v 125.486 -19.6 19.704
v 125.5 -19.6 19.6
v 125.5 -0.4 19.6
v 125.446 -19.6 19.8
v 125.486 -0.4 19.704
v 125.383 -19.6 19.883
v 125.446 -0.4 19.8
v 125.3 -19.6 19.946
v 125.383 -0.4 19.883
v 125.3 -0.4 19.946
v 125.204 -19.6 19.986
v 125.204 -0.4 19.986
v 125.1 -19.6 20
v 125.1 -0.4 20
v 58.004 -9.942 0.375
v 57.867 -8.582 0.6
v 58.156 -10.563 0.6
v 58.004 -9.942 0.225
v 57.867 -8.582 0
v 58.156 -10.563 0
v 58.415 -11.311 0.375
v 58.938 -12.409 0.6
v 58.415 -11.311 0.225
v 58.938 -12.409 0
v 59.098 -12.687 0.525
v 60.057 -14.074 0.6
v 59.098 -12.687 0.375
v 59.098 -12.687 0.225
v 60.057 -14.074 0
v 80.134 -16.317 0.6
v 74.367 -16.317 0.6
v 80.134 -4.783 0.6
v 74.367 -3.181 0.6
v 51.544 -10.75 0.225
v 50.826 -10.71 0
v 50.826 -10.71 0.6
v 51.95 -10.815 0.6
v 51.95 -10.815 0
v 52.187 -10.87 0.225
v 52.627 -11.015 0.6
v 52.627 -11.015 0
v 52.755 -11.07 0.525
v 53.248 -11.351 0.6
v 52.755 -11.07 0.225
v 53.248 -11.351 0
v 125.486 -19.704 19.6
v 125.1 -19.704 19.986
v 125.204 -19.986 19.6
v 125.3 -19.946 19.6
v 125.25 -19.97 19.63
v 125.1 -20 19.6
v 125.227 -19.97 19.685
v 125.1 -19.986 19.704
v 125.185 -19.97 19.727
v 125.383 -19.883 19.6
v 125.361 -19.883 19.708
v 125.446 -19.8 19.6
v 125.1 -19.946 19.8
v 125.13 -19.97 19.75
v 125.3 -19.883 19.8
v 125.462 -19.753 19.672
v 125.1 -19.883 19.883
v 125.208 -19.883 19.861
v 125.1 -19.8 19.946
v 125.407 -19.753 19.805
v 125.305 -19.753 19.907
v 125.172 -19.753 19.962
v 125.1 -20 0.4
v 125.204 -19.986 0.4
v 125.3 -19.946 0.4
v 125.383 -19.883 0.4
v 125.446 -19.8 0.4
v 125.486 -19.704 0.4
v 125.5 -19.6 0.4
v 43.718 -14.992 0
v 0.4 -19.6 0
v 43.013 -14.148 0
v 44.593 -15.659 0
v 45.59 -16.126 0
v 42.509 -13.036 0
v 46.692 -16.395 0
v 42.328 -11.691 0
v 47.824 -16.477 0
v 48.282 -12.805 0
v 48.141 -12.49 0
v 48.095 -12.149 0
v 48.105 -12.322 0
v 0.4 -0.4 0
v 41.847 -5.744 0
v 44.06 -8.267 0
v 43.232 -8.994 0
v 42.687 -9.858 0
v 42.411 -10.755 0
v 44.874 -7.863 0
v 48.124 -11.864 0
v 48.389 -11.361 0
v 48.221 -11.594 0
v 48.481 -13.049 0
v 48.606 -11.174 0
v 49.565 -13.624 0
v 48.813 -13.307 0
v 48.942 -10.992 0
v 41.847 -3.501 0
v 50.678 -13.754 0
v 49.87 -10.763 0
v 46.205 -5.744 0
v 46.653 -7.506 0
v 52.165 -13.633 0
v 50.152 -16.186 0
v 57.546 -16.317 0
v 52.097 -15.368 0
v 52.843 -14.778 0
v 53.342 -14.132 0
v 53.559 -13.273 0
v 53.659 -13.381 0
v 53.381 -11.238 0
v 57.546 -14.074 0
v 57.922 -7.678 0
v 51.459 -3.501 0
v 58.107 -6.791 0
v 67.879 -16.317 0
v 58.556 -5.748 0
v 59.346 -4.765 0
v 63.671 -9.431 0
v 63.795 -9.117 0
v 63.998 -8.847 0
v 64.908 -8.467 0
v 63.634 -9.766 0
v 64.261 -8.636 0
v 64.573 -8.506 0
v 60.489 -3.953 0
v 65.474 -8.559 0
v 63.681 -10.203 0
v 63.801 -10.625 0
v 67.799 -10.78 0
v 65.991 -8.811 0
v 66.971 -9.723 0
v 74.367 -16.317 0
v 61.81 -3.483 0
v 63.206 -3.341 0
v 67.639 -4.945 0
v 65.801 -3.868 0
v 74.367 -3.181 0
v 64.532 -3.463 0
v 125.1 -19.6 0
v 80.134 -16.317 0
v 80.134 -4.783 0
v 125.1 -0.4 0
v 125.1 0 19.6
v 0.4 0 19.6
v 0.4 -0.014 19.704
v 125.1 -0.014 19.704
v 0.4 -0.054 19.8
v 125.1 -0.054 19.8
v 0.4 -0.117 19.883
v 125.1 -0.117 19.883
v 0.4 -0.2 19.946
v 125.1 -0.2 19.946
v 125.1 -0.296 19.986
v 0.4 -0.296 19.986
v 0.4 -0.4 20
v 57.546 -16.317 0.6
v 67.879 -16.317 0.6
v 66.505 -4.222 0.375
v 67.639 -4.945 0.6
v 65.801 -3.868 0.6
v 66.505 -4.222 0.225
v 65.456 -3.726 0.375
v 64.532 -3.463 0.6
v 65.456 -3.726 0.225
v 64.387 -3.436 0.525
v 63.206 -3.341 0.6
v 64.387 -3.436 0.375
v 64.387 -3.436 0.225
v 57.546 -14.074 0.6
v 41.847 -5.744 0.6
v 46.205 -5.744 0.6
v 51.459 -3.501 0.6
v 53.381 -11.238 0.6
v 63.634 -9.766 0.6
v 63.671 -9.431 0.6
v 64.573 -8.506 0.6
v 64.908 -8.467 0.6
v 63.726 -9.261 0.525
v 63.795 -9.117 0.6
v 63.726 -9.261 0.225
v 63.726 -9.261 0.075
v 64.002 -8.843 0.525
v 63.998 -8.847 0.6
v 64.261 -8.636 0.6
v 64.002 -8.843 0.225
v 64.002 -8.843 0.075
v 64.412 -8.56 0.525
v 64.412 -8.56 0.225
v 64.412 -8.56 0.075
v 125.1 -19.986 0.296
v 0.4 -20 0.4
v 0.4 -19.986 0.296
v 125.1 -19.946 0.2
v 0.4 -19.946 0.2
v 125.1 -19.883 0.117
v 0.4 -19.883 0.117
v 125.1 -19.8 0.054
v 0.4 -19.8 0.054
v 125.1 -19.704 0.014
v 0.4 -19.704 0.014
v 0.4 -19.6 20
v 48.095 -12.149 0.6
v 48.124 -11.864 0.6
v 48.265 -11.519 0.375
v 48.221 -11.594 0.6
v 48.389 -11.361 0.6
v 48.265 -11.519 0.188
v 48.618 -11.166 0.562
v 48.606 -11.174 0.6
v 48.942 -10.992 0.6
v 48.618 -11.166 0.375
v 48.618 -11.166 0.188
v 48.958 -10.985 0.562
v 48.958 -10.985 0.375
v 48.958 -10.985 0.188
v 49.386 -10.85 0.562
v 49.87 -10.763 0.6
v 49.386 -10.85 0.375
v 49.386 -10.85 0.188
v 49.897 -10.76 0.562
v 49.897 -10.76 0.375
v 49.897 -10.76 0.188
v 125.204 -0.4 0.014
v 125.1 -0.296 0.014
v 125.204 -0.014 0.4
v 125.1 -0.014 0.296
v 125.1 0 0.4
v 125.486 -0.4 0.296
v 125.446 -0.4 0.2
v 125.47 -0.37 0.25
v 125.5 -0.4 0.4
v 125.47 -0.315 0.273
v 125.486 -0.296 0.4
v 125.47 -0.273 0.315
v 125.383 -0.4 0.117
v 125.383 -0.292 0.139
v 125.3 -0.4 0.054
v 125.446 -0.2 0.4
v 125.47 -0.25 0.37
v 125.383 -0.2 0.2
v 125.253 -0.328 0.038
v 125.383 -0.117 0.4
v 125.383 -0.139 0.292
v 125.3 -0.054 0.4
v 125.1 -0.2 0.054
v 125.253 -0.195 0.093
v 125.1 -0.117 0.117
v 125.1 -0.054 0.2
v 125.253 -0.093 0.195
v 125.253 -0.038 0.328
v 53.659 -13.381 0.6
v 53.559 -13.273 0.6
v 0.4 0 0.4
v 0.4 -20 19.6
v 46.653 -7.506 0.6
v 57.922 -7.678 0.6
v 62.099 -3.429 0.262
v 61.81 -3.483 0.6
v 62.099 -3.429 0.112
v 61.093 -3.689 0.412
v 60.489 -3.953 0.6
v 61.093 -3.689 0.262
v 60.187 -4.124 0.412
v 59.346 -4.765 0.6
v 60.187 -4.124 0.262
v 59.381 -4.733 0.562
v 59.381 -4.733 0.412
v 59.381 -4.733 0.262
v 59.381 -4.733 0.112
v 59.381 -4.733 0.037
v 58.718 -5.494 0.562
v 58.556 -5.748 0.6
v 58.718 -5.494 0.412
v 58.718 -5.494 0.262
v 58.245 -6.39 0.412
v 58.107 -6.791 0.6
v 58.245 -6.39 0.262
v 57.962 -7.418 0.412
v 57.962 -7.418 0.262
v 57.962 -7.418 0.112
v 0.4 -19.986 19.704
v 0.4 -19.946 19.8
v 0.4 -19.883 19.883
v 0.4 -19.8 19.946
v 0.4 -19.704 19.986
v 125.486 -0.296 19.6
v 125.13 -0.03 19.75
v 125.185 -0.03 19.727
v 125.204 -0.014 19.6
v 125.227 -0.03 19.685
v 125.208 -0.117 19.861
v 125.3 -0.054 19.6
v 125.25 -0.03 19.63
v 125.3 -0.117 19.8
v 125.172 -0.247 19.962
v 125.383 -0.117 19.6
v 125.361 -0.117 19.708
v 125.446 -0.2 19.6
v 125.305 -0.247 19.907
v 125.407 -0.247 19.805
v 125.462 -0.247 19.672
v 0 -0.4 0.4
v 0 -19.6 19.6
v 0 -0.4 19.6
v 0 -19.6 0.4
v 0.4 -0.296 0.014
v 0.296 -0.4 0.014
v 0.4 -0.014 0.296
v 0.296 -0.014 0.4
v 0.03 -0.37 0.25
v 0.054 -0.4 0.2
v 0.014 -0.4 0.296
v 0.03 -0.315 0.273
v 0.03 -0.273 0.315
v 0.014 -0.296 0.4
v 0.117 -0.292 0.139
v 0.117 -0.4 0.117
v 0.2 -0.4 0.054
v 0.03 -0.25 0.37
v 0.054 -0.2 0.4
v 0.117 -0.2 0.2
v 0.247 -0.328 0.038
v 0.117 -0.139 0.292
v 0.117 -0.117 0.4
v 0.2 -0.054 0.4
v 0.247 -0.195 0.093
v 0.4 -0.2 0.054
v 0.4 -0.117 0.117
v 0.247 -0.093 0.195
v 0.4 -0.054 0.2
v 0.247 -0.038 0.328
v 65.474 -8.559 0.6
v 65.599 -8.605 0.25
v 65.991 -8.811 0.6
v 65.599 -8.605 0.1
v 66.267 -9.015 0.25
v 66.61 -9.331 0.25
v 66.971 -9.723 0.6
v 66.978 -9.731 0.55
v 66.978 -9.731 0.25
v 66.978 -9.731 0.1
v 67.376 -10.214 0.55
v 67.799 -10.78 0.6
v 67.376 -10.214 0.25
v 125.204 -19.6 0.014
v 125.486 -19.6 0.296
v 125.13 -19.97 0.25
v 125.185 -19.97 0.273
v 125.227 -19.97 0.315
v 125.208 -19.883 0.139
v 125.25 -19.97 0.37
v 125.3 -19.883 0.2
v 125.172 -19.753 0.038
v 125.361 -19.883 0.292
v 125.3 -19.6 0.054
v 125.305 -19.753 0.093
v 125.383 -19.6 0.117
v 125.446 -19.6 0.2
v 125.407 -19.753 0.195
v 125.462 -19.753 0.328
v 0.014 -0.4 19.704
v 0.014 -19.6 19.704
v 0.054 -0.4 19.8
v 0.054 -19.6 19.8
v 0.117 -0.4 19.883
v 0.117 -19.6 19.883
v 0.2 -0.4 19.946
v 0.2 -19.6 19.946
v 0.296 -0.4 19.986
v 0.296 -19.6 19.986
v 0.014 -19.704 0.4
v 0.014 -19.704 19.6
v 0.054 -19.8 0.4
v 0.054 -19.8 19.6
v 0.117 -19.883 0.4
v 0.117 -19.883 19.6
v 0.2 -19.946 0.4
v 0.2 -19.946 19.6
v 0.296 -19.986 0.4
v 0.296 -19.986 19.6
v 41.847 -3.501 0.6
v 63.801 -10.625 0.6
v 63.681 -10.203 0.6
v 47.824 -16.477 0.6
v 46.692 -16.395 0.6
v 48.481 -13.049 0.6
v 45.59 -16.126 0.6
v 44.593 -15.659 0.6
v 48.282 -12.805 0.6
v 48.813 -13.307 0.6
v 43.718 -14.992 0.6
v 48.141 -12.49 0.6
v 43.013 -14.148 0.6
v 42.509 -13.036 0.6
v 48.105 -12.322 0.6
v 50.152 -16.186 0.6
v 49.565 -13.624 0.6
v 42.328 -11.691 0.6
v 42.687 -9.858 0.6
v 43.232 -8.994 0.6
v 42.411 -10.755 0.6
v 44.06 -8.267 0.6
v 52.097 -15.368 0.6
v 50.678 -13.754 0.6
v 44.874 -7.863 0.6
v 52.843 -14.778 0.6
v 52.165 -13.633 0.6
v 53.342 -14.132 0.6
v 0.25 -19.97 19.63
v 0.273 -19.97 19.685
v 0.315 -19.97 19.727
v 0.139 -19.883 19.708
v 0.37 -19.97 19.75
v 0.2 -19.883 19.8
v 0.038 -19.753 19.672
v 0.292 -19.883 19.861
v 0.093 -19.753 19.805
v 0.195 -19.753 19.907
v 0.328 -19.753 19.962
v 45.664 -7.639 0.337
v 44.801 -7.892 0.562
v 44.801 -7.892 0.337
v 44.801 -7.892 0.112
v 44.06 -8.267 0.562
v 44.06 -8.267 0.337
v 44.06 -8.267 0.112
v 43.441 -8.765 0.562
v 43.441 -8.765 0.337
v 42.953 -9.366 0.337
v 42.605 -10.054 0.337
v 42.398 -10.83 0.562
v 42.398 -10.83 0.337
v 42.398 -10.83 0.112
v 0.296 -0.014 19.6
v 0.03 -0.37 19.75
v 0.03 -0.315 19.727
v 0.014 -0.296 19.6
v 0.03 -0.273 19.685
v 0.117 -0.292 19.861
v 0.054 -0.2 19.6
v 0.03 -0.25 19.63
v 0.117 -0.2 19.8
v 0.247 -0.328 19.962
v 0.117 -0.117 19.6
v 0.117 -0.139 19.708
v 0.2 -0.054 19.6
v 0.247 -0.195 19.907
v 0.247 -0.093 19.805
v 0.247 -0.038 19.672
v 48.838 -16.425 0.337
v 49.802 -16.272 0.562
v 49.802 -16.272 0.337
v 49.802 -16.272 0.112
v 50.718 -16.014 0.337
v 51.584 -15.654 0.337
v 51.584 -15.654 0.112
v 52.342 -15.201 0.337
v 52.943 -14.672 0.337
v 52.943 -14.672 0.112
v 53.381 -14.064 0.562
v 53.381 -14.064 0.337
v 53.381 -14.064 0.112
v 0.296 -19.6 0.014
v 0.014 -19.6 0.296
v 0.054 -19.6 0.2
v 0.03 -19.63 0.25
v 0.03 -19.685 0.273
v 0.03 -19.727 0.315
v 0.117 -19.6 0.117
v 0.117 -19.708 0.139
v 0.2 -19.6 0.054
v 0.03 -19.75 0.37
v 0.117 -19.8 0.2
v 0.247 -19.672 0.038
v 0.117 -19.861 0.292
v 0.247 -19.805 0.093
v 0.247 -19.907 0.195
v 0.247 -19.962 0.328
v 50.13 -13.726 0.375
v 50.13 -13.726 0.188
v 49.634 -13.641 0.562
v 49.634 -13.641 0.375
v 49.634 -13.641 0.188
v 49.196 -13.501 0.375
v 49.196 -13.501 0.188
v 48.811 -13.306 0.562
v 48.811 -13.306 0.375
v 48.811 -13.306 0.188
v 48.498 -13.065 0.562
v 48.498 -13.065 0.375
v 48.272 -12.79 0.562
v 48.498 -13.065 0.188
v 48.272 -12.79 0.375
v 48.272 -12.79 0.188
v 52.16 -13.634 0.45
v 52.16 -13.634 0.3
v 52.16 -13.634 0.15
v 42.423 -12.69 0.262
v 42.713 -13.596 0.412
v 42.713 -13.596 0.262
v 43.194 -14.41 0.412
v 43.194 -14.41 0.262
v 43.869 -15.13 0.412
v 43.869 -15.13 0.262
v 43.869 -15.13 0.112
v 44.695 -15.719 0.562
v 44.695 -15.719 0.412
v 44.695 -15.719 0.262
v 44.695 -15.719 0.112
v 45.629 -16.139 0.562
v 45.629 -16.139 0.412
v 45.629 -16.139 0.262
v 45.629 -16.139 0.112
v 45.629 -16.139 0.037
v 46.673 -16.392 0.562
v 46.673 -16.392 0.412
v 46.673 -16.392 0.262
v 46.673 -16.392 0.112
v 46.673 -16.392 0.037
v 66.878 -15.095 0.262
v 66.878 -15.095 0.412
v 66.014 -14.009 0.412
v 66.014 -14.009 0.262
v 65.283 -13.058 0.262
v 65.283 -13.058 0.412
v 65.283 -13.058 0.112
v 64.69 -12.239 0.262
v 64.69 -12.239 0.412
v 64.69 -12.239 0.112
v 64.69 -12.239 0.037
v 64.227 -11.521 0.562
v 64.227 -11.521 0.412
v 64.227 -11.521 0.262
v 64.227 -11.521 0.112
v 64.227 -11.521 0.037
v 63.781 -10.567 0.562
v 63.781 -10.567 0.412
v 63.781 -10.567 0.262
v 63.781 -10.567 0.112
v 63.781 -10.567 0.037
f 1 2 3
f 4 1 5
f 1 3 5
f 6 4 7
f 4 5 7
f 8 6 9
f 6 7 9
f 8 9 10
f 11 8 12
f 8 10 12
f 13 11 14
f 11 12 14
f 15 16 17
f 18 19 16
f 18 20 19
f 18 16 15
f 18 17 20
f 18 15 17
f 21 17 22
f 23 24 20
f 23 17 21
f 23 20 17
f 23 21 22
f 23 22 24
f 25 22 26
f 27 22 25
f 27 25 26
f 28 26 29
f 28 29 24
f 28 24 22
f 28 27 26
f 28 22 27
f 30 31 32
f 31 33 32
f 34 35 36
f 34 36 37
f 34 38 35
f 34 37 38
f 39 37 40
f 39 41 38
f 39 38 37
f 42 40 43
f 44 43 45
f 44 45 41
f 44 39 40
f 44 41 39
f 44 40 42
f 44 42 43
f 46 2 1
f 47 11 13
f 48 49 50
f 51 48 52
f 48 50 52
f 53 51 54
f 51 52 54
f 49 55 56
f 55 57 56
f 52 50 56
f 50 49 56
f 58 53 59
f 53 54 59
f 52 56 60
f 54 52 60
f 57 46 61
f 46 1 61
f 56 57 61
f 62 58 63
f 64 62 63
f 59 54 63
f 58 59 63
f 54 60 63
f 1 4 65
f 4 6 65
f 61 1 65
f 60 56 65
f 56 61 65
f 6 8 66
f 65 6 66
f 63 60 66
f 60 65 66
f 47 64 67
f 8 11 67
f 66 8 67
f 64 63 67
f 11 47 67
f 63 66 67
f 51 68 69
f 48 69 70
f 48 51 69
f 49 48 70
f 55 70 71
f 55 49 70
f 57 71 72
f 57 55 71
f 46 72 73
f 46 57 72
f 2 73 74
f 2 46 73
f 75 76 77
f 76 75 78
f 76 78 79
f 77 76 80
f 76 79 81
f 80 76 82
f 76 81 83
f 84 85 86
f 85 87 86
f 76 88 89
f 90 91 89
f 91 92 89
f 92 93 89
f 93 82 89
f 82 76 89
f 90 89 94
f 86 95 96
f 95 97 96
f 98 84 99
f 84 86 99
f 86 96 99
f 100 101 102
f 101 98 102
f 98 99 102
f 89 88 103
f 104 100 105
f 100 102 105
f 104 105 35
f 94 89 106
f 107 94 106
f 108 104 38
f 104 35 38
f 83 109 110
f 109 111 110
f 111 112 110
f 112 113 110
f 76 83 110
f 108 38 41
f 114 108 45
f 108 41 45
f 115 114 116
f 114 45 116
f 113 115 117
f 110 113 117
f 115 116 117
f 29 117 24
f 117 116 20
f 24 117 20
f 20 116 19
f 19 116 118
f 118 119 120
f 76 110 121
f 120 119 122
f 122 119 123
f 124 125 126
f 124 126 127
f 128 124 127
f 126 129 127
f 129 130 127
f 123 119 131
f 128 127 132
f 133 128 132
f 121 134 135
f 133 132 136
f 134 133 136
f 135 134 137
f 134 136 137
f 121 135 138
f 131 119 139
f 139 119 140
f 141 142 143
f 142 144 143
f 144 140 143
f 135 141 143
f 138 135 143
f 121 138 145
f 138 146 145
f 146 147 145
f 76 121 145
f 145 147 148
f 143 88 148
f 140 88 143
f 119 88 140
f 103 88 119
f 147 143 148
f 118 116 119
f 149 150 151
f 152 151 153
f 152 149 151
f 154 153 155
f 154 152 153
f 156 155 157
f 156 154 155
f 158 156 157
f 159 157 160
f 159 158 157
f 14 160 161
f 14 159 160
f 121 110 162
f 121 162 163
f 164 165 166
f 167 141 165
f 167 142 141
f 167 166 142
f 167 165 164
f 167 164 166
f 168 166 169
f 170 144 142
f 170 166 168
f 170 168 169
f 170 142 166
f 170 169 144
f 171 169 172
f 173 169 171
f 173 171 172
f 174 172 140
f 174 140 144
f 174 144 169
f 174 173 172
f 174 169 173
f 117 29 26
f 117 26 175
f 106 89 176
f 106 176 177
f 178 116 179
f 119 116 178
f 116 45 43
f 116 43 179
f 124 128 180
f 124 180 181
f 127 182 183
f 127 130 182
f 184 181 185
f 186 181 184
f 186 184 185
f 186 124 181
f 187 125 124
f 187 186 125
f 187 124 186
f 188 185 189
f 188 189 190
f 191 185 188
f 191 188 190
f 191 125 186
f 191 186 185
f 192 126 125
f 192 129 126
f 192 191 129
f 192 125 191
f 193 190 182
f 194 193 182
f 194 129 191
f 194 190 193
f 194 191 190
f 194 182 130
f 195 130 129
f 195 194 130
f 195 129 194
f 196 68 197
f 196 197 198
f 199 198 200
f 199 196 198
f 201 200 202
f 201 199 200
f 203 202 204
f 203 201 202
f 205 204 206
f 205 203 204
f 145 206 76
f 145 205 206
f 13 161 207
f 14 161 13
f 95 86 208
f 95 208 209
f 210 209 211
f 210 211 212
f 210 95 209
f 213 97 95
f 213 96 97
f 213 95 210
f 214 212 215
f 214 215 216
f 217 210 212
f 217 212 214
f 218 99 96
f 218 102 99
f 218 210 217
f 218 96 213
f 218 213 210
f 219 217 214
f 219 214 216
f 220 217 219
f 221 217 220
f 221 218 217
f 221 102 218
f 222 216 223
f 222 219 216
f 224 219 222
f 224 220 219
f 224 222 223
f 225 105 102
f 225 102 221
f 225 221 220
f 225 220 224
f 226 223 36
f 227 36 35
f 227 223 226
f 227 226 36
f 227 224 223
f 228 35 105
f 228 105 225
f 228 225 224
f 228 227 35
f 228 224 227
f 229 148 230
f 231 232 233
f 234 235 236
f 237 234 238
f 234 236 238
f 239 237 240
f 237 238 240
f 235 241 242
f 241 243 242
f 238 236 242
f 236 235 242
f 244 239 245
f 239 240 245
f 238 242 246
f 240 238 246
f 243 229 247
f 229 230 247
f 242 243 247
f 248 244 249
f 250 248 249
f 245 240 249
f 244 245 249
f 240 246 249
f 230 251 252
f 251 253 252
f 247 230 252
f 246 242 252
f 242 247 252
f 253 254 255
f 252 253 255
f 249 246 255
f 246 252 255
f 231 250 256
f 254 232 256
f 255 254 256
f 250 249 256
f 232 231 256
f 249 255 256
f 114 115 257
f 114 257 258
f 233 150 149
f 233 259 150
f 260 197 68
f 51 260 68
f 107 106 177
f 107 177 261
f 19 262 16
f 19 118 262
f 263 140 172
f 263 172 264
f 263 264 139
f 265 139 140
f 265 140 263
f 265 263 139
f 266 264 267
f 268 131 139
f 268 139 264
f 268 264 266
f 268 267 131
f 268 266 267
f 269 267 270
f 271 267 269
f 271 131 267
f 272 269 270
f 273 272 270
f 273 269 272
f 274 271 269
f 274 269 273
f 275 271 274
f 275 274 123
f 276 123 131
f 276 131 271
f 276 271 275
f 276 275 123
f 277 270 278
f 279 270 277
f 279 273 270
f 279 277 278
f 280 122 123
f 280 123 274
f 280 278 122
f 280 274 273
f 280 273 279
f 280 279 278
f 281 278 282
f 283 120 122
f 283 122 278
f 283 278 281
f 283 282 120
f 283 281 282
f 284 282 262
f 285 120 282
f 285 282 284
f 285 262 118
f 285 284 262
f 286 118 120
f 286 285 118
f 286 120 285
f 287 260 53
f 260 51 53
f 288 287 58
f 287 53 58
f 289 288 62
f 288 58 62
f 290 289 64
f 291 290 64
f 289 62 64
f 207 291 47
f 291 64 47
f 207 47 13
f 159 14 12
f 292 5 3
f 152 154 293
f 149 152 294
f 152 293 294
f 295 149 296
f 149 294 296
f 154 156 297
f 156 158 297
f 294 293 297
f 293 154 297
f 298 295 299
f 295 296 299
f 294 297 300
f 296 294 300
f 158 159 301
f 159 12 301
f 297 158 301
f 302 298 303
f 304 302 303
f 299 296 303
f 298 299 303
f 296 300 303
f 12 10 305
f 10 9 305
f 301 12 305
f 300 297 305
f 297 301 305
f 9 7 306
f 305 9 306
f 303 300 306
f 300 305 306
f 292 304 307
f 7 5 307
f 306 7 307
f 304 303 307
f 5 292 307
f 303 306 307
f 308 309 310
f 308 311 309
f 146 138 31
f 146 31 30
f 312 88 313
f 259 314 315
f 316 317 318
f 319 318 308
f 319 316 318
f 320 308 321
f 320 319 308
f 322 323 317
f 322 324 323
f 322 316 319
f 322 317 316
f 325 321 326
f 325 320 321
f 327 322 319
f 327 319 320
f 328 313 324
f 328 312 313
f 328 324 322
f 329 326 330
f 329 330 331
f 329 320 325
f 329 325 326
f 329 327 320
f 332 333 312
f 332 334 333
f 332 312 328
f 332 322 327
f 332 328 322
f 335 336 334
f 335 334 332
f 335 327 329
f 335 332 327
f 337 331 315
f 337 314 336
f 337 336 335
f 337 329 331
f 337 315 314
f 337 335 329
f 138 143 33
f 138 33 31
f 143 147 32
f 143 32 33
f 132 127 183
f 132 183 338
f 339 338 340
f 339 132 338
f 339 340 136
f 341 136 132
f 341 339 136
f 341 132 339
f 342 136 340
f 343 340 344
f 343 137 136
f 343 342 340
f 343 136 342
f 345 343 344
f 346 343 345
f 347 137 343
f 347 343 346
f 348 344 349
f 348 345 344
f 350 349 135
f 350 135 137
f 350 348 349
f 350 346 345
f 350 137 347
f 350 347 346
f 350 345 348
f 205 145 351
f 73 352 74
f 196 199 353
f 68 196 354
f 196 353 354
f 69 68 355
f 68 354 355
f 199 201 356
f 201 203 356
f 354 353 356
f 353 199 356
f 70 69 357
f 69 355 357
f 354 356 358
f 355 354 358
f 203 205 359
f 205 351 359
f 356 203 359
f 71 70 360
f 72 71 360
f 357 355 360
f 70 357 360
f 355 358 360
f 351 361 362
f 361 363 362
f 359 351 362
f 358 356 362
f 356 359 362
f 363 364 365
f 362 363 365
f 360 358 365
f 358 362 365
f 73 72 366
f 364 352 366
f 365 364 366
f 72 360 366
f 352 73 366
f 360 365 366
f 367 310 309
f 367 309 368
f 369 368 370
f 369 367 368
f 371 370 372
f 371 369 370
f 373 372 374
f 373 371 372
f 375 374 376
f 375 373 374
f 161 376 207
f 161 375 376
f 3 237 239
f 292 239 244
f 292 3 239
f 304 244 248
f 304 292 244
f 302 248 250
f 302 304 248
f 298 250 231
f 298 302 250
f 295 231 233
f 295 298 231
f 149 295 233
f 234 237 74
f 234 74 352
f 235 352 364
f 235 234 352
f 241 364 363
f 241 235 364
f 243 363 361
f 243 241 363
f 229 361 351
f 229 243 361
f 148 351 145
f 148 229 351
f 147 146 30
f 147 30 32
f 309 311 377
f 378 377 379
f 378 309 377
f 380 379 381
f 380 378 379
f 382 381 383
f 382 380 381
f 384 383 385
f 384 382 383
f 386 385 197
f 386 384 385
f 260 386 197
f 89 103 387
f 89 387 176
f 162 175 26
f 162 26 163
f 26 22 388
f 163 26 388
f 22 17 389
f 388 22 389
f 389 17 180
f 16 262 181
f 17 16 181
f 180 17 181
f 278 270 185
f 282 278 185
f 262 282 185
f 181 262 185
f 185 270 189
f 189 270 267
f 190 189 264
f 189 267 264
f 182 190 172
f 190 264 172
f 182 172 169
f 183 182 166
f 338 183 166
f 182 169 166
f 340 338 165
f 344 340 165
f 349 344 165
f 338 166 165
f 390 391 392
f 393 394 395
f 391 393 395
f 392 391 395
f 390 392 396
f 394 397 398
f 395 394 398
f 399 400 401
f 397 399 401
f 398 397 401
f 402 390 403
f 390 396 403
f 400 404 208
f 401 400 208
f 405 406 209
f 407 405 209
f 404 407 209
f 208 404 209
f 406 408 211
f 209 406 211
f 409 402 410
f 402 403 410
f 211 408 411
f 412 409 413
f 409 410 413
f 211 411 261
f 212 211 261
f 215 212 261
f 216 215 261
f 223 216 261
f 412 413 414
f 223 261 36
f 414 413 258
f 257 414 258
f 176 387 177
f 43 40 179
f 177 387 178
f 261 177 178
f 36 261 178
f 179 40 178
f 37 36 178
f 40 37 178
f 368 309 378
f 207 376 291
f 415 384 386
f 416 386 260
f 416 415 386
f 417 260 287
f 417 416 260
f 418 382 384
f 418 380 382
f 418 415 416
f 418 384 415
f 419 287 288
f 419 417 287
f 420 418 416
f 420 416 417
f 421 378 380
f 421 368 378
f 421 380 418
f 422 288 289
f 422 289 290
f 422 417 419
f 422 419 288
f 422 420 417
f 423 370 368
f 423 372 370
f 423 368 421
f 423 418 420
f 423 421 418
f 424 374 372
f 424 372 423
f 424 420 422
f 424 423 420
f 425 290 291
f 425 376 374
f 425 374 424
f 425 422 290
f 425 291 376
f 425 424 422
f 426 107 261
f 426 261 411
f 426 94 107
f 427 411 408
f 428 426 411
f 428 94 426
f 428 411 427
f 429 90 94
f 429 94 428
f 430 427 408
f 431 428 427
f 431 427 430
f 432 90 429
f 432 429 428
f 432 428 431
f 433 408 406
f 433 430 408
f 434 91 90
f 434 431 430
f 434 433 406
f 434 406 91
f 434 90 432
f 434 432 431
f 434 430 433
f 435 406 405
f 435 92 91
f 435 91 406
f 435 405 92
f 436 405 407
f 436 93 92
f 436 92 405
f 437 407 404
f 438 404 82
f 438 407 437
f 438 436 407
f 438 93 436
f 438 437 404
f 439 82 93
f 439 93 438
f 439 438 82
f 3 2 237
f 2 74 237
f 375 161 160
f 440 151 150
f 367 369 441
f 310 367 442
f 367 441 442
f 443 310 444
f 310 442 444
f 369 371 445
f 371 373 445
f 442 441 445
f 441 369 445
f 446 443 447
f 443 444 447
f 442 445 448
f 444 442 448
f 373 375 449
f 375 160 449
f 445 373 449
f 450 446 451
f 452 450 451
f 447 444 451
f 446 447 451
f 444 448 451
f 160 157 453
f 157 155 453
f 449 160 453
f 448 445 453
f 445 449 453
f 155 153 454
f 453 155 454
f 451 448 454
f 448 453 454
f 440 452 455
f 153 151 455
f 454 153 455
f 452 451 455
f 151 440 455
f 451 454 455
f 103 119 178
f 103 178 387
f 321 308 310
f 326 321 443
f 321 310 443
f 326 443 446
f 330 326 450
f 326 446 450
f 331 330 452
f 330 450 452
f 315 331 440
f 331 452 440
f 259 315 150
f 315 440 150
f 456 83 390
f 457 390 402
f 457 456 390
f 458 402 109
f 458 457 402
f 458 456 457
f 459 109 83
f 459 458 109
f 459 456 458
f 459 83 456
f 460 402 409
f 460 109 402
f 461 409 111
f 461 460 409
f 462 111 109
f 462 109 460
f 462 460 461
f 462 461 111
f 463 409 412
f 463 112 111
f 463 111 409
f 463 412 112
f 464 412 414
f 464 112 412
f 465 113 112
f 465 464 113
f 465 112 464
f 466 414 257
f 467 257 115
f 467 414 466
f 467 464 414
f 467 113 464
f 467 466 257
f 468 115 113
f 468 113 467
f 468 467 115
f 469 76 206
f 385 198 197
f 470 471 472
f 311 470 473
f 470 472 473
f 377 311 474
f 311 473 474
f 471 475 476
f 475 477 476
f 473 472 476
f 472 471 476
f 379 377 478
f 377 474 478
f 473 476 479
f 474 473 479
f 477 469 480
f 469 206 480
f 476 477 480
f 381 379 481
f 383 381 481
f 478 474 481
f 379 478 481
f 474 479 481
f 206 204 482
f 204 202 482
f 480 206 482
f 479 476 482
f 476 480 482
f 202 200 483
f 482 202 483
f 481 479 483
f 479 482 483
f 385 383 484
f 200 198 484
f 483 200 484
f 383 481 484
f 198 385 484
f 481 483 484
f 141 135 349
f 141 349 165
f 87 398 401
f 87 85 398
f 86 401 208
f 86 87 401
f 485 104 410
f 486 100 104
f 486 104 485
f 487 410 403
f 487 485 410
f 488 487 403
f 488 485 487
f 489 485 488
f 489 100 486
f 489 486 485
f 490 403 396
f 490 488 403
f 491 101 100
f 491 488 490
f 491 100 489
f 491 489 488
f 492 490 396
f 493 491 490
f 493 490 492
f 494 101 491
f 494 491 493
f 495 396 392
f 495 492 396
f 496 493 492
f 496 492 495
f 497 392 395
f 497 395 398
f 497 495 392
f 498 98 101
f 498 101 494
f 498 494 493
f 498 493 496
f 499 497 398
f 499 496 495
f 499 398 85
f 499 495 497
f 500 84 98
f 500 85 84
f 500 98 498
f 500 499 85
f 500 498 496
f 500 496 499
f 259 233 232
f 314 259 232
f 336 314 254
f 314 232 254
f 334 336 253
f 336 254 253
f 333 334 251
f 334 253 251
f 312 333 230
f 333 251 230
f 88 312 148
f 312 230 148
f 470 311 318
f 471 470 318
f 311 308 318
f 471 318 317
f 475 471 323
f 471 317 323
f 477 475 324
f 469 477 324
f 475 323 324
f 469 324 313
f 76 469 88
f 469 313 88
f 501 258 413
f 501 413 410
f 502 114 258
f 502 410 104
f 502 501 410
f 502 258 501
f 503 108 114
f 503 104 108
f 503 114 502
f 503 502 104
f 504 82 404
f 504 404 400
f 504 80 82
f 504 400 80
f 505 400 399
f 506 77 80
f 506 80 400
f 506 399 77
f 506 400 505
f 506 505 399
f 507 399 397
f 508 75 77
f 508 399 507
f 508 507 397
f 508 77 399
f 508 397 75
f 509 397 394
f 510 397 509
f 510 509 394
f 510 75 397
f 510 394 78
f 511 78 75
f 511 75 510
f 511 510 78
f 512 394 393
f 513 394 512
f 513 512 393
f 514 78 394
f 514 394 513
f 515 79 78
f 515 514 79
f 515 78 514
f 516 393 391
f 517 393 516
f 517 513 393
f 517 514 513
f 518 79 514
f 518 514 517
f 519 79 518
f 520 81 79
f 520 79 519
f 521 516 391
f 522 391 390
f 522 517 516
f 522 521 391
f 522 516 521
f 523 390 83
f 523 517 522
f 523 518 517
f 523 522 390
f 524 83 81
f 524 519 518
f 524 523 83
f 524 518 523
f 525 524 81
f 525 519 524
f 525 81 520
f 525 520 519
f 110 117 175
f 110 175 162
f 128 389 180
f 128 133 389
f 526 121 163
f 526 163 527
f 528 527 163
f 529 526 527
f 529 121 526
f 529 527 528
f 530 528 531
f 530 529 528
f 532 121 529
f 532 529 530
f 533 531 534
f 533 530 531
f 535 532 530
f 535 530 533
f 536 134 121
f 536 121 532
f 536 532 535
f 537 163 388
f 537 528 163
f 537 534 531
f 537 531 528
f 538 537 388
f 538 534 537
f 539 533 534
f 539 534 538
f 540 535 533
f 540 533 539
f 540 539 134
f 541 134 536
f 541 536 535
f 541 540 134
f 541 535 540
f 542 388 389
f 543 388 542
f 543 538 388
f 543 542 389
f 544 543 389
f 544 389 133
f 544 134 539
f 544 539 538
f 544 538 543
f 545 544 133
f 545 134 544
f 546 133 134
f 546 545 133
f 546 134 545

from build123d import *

# Parameters (mm, degrees)
SKETCH1_W           = 125.5
SKETCH1_H           = 20
BOSS_EXTRUDE1_DEPTH = 20
FILLET1_R           = 0.4
CUT_EXTRUDE1_DEPTH  = 0.6


with BuildPart() as part:
    # Sketch1 → Boss-Extrude1 (new body)
    with BuildSketch(Plane.XY):
        with Locations((62.75, -10)):
            Rectangle(SKETCH1_W, SKETCH1_H)
    extrude(amount=BOSS_EXTRUDE1_DEPTH)

    # Fillet1
    fillet1_edges = [part.edges().sort_by_distance(p)[0] for p in [
        (125.5, -10, 20),
        (62.75, 0, 20),
        (0, -10, 20),
        (62.75, 0, 0),
        (125.5, -10, 0),
        (62.75, -20, 0),
        (0, -10, 0),
        (0, 0, 10),
        (125.5, 0, 10),
        (125.5, -20, 10),
        (0, -20, 10),
        (62.75, -20, 20),
    ]]
    fillet(fillet1_edges, radius=FILLET1_R)

    # Sketch2 → Cut-Extrude1 (cut)
    with BuildSketch(Plane(origin=(0, 0, 0), x_dir=(-1, 0, 0), z_dir=(0, 0, -1))):
        Polygon((-74.366945263, -16.316901728), (-80.134035107, -16.316901728), (-80.134035107, -4.78272204), (-74.366945263, -3.180752639), align=None)
        with BuildLine():
            Line((-57.546266552, -14.074144566), (-57.546266552, -16.316901728))
            Line((-57.546266552, -16.316901728), (-67.878969189, -16.316901728))
            add(Edge.make_bspline(
                [(-67.878969189, -16.316901728), (-67.705972662, -16.107710863), (-67.370455977, -15.701997369), (-66.887548782, -15.10859586), (-66.43763762, -14.549527819), (-66.023644885, -14.021820882), (-65.640372658, -13.529579363), (-65.291318914, -13.071459877), (-64.978619028, -12.64512484), (-64.695729106, -12.251325979), (-64.445822511, -11.882014175), (-64.228201066, -11.532020948), (-64.049016346, -11.195376551), (-63.896188231, -10.878752474), (-63.780730828, -10.57709072), (-63.695526935, -10.293154159), (-63.646326017, -10.024196815), (-63.6378279, -9.849954737), (-63.633750276, -9.766348724)],
                knots=[0, 0, 0, 0, 1.648477186, 3.197125458, 4.646012435, 6.006316077, 7.270166078, 8.434548375, 9.503700427, 10.480865904, 11.378855857, 12.211361565, 12.982121599, 13.693810259, 14.344973607, 14.941442485, 15.492075768, 16, 16, 16, 16], degree=3))
            add(Edge.make_bspline(
                [(-63.633750276, -9.766348724), (-63.63761519, -9.678226006), (-63.645182749, -9.505680427), (-63.718477287, -9.258876389), (-63.835299629, -9.03401472), (-63.996612476, -8.837126712), (-64.18913759, -8.672378913), (-64.409501583, -8.551568757), (-64.652136972, -8.478827964), (-64.821377215, -8.471165342), (-64.907816565, -8.467251663)],
                knots=[0, 0, 0, 0, 1.040931809, 2.038159793, 3.018963058, 4.023210429, 5.032448662, 6.000486047, 6.978749463, 8, 8, 8, 8], degree=3))
            add(Edge.make_bspline(
                [(-64.907816565, -8.467251663), (-65.024529267, -8.474287394), (-65.260711798, -8.488525064), (-65.608569086, -8.597731909), (-65.949290336, -8.772233168), (-66.222122639, -8.97200242), (-66.440175186, -9.166520594), (-66.616282736, -9.333652206), (-66.795353229, -9.525249725), (-66.983192681, -9.735511466), (-67.178926331, -9.966362222), (-67.38085624, -10.218471226), (-67.588582252, -10.492069183), (-67.72742926, -10.682243763), (-67.798870719, -10.780094985)],
                knots=[0, 0, 0, 0, 1.093734572, 2.213306666, 3.389740152, 4.673908339, 5.372839767, 6.13144368, 6.951060167, 7.832681641, 8.776975261, 9.790579287, 10.863178676, 12, 12, 12, 12], degree=3))
            Line((-67.798870719, -10.780094985), (-67.638673779, -4.945422058))
            add(Edge.make_bspline(
                [(-67.638673779, -4.945422058), (-67.448366635, -4.812826952), (-67.080258926, -4.556350607), (-66.522099469, -4.225019564), (-65.986501615, -3.946166391), (-65.463517955, -3.719429652), (-64.932723712, -3.549637799), (-64.382912665, -3.425321537), (-63.803228059, -3.356109491), (-63.407814726, -3.346077037), (-63.205724077, -3.340949579)],
                knots=[0, 0, 0, 0, 1.159094463, 2.242015715, 3.241844795, 4.176118816, 5.087519341, 6.023486108, 6.989829271, 8, 8, 8, 8], degree=3))
            add(Edge.make_bspline(
                [(-63.205724077, -3.340949579), (-63.016958514, -3.345259345), (-62.646621459, -3.353714627), (-62.104066149, -3.420644673), (-61.585734161, -3.526575274), (-61.093284803, -3.680564483), (-60.624606953, -3.875600406), (-60.182524331, -4.117652558), (-59.765053358, -4.401850534), (-59.375599547, -4.726537369), (-59.018864943, -5.087565258), (-58.709944035, -5.488271101), (-58.447147473, -5.922035103), (-58.234454585, -6.39035542), (-58.068614997, -6.8914053), (-57.952832255, -7.425911988), (-57.877361687, -7.992848915), (-57.870284678, -8.382729395), (-57.866660432, -8.582393213)],
                knots=[0, 0, 0, 0, 1.074229238, 2.107518372, 3.106995267, 4.081931566, 5.039864063, 5.992033513, 6.945777082, 7.910233706, 8.874140538, 9.828888763, 10.783518848, 11.754792575, 12.750561242, 13.781894681, 14.864073997, 16, 16, 16, 16], degree=3))
            add(Edge.make_bspline(
                [(-57.866660432, -8.582393213), (-57.873643881, -8.808888166), (-57.88770629, -9.264975782), (-57.995575418, -9.948818509), (-58.165512868, -10.635407813), (-58.408984758, -11.322960433), (-58.71785052, -12.01272301), (-59.097242158, -12.703498853), (-59.541692122, -13.39796021), (-59.882545319, -13.845353678), (-60.056852973, -14.074144566)],
                knots=[0, 0, 0, 0, 0.902103076, 1.816543967, 2.751824317, 3.716988727, 4.718465792, 5.75981875, 6.854402009, 8, 8, 8, 8], degree=3))
            Line((-60.056852973, -14.074144566), (-57.546266552, -14.074144566))
        make_face()
        with BuildLine():
            Line((-41.846966422, -3.501146519), (-41.846966422, -5.743903681))
            Line((-41.846966422, -5.743903681), (-46.204823808, -5.743903681))
            Line((-46.204823808, -5.743903681), (-46.652874625, -7.506070022))
            add(Edge.make_bspline(
                [(-46.652874625, -7.506070022), (-46.482321613, -7.519978175), (-46.150491526, -7.547038052), (-45.670998184, -7.632750902), (-45.221158106, -7.73968848), (-44.803517412, -7.883642785), (-44.416099293, -8.056302553), (-44.057713612, -8.259238727), (-43.732182612, -8.495373132), (-43.436864576, -8.758952053), (-43.17785264, -9.050652292), (-42.946787881, -9.360978428), (-42.757049446, -9.697754865), (-42.597058119, -10.053798877), (-42.478880766, -10.434318217), (-42.390442896, -10.834337514), (-42.337206819, -11.255917098), (-42.330815898, -11.544215241), (-42.327557242, -11.691215082)],
                knots=[0, 0, 0, 0, 1.217686971, 2.369147101, 3.464164001, 4.50681488, 5.509294206, 6.480446105, 7.433459119, 8.367357942, 9.292867885, 10.206577389, 11.116571509, 12.039427559, 12.980684995, 13.947849621, 14.953632596, 16, 16, 16, 16], degree=3))
            add(Edge.make_bspline(
                [(-42.327557242, -11.691215082), (-42.332725578, -11.861629228), (-42.342878918, -12.196412612), (-42.412286374, -12.688172595), (-42.536879393, -13.154655851), (-42.703957245, -13.60012135), (-42.924799915, -14.01898868), (-43.18830034, -14.419192643), (-43.506136215, -14.791086867), (-43.865866195, -15.13790055), (-44.262063383, -15.453344127), (-44.692407679, -15.725153686), (-45.146600907, -15.96107806), (-45.631005561, -16.147423967), (-46.140669633, -16.296555526), (-46.678014611, -16.399103083), (-47.241820982, -16.467820433), (-47.627191764, -16.4739588), (-47.82431475, -16.477098668)],
                knots=[0, 0, 0, 0, 1.001936993, 1.968333403, 2.91189952, 3.835723145, 4.759455594, 5.690079001, 6.647318133, 7.629130035, 8.624331341, 9.619109397, 10.617364864, 11.628542224, 12.665579242, 13.7353975, 14.841621563, 16, 16, 16, 16], degree=3))
            add(Edge.make_bspline(
                [(-47.82431475, -16.477098668), (-47.995452758, -16.475053682), (-48.334038311, -16.471007808), (-48.835051603, -16.427924871), (-49.324287373, -16.367601082), (-49.801602388, -16.27697018), (-50.265692358, -16.158728213), (-50.719384223, -16.018967858), (-51.158976946, -15.851259859), (-51.58211369, -15.659515534), (-51.981403937, -15.449441543), (-52.339227629, -15.208497153), (-52.664104958, -14.957055497), (-52.944815308, -14.680999749), (-53.186215526, -14.384843017), (-53.386082097, -14.069843268), (-53.548162951, -13.734853048), (-53.621822964, -13.499525351), (-53.658987677, -13.380792185)],
                knots=[0, 0, 0, 0, 1.163667245, 2.302240872, 3.417871835, 4.515255233, 5.603932667, 6.673677212, 7.742352562, 8.801402191, 9.832207051, 10.806445689, 11.731706445, 12.622549934, 13.477799023, 14.324761977, 15.154768787, 16, 16, 16, 16], degree=3))
            Line((-53.658987677, -13.380792185), (-53.55886459, -13.273159866))
            add(Edge.make_bspline(
                [(-53.55886459, -13.273159866), (-53.330613981, -13.347625882), (-52.871949032, -13.497263826), (-52.157836047, -13.643020924), (-51.424612066, -13.737143757), (-50.928429994, -13.74817774), (-50.677822745, -13.753750686)],
                knots=[0, 0, 0, 0, 0.98115573, 1.97161245, 2.975519971, 4, 4, 4, 4], degree=3))
            add(Edge.make_bspline(
                [(-50.677822745, -13.753750686), (-50.584340925, -13.75214615), (-50.40133342, -13.749004982), (-50.132991054, -13.729209046), (-49.877825928, -13.694925577), (-49.637285272, -13.644277755), (-49.410062417, -13.582499541), (-49.197250101, -13.503969468), (-48.996145528, -13.415036947), (-48.810927669, -13.310055836), (-48.645272381, -13.193042846), (-48.496992607, -13.070667442), (-48.373408996, -12.936145926), (-48.270480154, -12.794812841), (-48.191182852, -12.644659155), (-48.136347966, -12.486783515), (-48.098864731, -12.321242642), (-48.096064227, -12.20705874), (-48.094647086, -12.149278208)],
                knots=[0, 0, 0, 0, 1.331593224, 2.606833628, 3.830465399, 4.995919138, 6.106066241, 7.181376235, 8.224006534, 9.235276467, 10.207957358, 11.110353994, 11.968214499, 12.802704758, 13.594817664, 14.376700065, 15.178560784, 16, 16, 16, 16], degree=3))
            add(Edge.make_bspline(
                [(-48.094647086, -12.149278208), (-48.096215228, -12.090702648), (-48.099265921, -11.97674867), (-48.133188948, -11.812524108), (-48.186522157, -11.659131543), (-48.260425217, -11.515786217), (-48.361386515, -11.388115386), (-48.477586534, -11.267157393), (-48.618557274, -11.160802325), (-48.78050932, -11.065991168), (-48.961738669, -10.979818408), (-49.166154048, -10.908685384), (-49.390872731, -10.845829137), (-49.637137752, -10.797305349), (-49.903398763, -10.756277325), (-50.191832798, -10.730564192), (-50.501526285, -10.711889455), (-50.715336983, -10.710648325), (-50.825504299, -10.710008824)],
                knots=[0, 0, 0, 0, 0.814446033, 1.584438367, 2.32285386, 3.071071758, 3.816851133, 4.580773861, 5.400915678, 6.265507767, 7.190421024, 8.189801626, 9.274824997, 10.436656683, 11.681899897, 13.023836303, 14.466512816, 16, 16, 16, 16], degree=3))
            add(Edge.make_bspline(
                [(-50.825504299, -10.710008824), (-50.94822196, -10.711827853), (-51.188198727, -10.715384999), (-51.53928648, -10.746172307), (-51.871525144, -10.794811586), (-52.185032293, -10.865966434), (-52.47954607, -10.954216522), (-52.754585324, -11.065898504), (-53.012007067, -11.194903344), (-53.170152468, -11.299158338), (-53.248483018, -11.350796584)],
                knots=[0, 0, 0, 0, 1.156825485, 2.262194689, 3.320222464, 4.320246568, 5.290750089, 6.21544117, 7.116095219, 8, 8, 8, 8], degree=3))
            Line((-53.248483018, -11.350796584), (-53.381146109, -11.238158111))
            Line((-53.381146109, -11.238158111), (-51.458782828, -3.501146519))
            Line((-51.458782828, -3.501146519), (-41.846966422, -3.501146519))
        make_face()
    extrude(amount=-CUT_EXTRUDE1_DEPTH, mode=Mode.SUBTRACT)


solid = part.part
